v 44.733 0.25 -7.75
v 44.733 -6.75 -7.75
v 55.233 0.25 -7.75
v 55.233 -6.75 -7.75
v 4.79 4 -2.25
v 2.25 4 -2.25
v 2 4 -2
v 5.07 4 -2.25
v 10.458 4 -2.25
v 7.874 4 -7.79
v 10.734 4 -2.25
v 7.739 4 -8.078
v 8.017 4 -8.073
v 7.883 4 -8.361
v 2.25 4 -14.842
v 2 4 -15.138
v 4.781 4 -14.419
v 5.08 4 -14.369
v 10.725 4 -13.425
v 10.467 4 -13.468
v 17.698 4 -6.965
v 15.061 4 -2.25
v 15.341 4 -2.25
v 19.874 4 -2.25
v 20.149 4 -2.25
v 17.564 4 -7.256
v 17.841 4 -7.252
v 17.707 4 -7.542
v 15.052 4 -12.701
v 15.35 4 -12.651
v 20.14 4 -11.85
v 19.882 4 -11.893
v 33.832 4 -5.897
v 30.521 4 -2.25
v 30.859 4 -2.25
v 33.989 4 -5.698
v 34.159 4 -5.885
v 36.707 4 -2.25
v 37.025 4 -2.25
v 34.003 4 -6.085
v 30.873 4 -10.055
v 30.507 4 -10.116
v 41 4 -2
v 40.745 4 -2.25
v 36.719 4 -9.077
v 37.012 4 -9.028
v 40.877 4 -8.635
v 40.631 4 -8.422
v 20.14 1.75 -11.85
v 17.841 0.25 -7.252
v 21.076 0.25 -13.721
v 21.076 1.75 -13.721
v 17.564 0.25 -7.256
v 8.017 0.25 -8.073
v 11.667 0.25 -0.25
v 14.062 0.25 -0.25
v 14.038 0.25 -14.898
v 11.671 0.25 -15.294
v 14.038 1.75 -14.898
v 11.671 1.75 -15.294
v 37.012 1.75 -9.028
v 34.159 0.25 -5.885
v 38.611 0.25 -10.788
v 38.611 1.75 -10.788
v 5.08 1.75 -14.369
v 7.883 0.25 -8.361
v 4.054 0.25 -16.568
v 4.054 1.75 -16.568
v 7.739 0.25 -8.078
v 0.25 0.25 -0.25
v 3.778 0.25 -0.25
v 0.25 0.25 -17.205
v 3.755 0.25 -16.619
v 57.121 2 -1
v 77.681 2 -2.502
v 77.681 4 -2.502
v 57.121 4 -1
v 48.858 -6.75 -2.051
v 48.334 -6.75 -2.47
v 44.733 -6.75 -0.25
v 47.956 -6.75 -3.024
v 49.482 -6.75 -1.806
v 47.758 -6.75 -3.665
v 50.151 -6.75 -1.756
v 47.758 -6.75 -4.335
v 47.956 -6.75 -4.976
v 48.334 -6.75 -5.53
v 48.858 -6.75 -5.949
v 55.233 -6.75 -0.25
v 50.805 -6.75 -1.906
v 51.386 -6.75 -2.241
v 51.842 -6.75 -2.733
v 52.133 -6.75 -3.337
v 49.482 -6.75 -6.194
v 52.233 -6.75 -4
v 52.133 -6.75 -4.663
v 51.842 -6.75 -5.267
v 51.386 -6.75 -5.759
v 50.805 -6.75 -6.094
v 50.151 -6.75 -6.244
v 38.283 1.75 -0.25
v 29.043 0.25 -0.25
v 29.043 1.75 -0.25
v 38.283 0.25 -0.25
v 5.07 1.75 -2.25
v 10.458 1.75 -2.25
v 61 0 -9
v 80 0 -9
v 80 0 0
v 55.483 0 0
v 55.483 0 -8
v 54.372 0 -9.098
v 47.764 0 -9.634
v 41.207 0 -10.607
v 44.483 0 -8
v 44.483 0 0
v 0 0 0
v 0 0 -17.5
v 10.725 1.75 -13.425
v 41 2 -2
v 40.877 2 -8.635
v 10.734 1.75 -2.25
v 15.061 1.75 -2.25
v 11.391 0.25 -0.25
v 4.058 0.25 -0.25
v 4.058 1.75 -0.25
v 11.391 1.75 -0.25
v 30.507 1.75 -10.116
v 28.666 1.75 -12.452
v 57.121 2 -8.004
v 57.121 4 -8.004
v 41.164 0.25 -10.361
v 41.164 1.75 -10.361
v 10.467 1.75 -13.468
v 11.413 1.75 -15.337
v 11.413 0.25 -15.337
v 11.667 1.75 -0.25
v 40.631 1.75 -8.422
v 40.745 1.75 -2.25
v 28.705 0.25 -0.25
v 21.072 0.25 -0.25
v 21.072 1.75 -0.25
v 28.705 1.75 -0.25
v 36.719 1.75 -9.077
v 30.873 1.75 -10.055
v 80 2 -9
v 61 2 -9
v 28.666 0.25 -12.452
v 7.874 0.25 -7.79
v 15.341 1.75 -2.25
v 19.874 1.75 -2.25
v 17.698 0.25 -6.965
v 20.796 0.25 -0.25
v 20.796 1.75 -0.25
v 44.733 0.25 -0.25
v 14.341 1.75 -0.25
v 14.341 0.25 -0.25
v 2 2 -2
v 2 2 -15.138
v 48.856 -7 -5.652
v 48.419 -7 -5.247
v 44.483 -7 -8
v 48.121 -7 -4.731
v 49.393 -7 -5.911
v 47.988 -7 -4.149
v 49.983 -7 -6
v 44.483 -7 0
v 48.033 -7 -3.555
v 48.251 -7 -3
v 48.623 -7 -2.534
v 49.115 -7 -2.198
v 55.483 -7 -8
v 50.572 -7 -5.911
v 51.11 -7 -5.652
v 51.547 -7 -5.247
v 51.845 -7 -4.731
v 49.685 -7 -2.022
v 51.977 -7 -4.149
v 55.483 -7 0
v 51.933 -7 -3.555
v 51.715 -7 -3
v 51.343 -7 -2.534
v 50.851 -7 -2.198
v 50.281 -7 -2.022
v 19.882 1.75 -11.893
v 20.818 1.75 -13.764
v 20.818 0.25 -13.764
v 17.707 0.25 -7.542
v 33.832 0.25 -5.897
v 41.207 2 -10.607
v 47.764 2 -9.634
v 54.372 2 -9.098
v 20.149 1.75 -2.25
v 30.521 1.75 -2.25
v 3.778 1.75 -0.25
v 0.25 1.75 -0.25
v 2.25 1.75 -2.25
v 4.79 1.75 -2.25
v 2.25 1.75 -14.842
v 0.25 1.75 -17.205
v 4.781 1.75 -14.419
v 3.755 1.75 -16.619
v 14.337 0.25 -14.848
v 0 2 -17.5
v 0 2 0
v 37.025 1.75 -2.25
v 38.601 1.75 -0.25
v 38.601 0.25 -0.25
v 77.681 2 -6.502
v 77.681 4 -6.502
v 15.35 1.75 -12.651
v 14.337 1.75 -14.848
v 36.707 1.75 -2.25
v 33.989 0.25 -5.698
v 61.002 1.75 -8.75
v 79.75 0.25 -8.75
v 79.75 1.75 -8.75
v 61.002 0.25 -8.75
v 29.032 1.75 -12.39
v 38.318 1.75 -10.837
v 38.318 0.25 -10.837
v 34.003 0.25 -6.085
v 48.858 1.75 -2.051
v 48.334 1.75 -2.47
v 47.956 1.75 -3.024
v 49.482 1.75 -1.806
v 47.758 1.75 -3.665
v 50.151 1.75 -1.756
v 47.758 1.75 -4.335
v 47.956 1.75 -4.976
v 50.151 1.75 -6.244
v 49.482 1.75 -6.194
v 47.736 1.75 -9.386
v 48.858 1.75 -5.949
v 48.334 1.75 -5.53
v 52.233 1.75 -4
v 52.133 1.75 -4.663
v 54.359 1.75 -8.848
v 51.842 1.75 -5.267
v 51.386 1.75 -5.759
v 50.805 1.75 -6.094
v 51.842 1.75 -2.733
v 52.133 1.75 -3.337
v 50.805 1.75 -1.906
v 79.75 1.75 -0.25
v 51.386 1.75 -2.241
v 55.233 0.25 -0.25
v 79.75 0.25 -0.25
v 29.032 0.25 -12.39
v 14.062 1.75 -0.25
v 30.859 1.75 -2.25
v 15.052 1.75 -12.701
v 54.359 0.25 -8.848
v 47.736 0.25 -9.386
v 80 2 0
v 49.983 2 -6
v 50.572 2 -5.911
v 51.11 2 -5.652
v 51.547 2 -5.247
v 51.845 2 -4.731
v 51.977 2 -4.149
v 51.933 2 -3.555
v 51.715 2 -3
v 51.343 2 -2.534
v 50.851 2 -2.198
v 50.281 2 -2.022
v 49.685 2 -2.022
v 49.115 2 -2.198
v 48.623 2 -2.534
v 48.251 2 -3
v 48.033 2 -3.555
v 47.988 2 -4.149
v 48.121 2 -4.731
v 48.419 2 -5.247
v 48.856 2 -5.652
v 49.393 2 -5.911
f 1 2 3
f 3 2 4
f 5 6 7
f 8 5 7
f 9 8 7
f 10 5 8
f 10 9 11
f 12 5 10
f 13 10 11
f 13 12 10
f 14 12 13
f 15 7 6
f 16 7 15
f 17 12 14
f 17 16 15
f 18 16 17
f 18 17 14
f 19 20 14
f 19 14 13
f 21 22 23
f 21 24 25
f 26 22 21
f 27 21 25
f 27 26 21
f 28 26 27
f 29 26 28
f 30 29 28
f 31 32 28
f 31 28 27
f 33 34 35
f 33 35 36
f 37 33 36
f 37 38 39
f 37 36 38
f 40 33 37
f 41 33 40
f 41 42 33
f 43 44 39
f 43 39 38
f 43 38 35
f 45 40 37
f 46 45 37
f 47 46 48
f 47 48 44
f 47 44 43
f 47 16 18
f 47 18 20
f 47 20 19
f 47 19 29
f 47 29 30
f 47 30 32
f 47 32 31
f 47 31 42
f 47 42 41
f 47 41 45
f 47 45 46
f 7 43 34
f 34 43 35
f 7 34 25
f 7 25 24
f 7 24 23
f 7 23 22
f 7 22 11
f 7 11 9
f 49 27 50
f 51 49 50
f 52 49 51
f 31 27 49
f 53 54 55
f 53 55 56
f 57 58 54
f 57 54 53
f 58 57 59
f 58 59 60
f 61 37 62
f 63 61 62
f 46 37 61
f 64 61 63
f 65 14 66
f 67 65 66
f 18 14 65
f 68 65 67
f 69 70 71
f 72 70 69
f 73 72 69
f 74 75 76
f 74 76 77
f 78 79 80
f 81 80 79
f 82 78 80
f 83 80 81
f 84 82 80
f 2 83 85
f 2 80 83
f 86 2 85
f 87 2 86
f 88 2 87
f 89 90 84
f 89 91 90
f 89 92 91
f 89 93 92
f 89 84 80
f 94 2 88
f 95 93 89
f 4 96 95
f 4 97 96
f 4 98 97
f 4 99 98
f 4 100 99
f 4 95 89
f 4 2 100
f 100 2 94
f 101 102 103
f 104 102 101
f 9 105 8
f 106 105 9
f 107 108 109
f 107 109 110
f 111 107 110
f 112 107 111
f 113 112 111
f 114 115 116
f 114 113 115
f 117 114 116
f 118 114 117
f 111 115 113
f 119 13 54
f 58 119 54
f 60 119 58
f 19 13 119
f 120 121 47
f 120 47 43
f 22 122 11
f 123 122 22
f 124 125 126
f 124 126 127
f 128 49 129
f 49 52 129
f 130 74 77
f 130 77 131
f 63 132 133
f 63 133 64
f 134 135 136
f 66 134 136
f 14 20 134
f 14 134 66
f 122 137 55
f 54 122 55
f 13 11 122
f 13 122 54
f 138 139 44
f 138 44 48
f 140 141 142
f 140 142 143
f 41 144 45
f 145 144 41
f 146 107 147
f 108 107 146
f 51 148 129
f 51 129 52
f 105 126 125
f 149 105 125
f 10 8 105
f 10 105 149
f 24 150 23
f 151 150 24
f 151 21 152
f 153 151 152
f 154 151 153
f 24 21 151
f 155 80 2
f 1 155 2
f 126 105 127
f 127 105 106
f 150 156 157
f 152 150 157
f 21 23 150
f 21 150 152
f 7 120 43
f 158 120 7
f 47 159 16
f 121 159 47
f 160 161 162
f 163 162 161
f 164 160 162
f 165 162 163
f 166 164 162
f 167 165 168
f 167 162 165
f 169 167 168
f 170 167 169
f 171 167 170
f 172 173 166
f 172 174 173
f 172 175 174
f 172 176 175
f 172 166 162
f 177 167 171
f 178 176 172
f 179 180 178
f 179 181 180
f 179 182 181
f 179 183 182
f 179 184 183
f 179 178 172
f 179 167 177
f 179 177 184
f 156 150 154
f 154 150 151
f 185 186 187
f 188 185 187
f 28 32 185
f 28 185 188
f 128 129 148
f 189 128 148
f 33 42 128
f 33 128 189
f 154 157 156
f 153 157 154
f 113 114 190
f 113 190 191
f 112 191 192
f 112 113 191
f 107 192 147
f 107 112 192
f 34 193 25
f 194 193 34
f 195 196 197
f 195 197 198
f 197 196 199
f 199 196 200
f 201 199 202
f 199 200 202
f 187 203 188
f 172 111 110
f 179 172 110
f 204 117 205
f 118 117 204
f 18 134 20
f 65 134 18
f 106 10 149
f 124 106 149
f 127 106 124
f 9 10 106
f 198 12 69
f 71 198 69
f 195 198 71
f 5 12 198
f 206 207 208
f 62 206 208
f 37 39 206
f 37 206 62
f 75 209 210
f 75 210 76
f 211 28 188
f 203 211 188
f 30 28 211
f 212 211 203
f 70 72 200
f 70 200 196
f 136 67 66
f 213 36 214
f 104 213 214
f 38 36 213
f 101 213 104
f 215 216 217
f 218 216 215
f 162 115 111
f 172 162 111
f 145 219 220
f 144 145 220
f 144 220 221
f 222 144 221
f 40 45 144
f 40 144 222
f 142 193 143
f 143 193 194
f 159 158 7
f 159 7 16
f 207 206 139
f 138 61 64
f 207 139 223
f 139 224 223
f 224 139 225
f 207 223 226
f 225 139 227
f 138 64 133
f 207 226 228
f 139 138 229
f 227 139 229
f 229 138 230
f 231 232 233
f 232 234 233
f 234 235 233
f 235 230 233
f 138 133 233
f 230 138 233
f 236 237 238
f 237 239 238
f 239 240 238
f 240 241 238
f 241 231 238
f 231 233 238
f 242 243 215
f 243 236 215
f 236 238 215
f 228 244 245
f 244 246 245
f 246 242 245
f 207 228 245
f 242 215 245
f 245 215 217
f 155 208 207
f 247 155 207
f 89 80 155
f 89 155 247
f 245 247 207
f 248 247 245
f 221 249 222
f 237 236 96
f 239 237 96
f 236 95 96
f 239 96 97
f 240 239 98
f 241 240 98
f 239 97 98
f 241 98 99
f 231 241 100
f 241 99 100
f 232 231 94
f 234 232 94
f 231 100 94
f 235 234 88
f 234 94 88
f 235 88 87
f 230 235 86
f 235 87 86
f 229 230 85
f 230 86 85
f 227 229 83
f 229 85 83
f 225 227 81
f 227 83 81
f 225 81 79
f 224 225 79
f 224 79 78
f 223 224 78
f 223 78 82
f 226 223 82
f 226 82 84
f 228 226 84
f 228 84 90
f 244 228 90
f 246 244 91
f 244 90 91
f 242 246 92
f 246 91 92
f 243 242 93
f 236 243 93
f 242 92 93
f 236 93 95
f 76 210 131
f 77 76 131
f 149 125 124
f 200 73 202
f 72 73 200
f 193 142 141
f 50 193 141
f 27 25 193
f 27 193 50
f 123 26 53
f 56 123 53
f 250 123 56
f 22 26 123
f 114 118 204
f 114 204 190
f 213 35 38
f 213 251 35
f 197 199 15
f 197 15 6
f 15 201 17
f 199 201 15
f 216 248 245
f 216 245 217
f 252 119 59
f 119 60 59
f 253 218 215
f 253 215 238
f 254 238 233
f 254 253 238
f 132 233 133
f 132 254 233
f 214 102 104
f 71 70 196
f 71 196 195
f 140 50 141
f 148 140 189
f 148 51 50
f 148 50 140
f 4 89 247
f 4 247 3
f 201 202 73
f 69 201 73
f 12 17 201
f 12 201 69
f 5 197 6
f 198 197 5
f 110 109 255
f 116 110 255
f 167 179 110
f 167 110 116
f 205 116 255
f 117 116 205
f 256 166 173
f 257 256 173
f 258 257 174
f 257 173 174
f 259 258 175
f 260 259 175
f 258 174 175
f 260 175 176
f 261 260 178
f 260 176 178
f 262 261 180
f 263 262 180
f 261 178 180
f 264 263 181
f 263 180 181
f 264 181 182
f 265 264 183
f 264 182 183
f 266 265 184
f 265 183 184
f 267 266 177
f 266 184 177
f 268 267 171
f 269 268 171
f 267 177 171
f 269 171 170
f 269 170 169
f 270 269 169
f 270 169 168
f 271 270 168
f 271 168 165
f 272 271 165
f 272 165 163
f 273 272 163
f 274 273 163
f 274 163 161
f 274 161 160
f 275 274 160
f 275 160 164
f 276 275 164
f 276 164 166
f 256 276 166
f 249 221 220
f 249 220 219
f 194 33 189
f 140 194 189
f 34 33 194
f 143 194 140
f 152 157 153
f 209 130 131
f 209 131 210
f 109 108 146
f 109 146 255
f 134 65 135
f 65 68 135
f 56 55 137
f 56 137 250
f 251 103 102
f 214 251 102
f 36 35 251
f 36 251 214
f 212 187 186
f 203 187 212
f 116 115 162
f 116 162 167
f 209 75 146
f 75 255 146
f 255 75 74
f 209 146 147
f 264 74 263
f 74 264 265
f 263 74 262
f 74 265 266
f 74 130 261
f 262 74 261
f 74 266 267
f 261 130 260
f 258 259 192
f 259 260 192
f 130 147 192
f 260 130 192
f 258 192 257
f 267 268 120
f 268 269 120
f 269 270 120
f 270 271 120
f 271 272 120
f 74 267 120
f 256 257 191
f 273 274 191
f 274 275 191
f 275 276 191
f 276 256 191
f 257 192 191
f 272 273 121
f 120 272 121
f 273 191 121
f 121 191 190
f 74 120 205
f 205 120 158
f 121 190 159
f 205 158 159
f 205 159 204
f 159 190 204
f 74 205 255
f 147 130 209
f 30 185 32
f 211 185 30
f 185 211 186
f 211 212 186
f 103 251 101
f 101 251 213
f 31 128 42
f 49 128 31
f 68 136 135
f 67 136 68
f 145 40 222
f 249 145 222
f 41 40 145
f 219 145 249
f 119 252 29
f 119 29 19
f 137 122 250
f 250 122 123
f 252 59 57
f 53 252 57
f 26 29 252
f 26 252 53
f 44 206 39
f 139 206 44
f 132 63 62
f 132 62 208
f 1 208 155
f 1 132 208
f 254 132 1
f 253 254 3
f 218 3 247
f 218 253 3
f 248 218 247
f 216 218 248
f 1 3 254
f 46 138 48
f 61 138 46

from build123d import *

# Parameters (mm, degrees)
BOSS_EXTRUDE1_DEPTH = 2
SKETCH2_W           = 11
SKETCH2_H           = 8
BOSS_EXTRUDE2_DEPTH = 7
SKETCH3_R           = 2
CUT_EXTRUDE2_DEPTH  = 83.38476801
BOSS_EXTRUDE3_DEPTH = 2
SHELL1_START        = 0.25
SHELL1_DEPTH        = 3.75
SHELL1_2_OUTLINE_R  = 2.25
SHELL1_2_DEPTH      = 1.5
SHELL1_START_2      = -6.75
SHELL1_3_OUTLINE_W  = 10.5
SHELL1_3_OUTLINE_H  = 7.5
SHELL1_3_OUTLINE_R  = 2.25
SHELL1_3_DEPTH      = 7
RIB2_REACH          = 84.627
BOSS_EXTRUDE4_DEPTH = 2


# Read off the part's stored shape, not the designer's step: Shell1
with BuildPart() as part:
    # Sketch1 → Boss-Extrude1 (new body)
    with BuildSketch(Plane(origin=(0, 0, 0), x_dir=(1, 0, 0), z_dir=(0, 1, 0))):
        with BuildLine():
            Line((0, 0), (0, 17.5))
            Line((0, 17.5), (41.207252266, 10.607357821))
            ThreePointArc((41.207252266, 10.607357821), (51.063628859, 9.311158863), (61, 9))
            Line((61, 9), (80, 9))
            Line((80, 9), (80, 0))
            Line((80, 0), (0, 0))
        make_face()
    extrude(amount=BOSS_EXTRUDE1_DEPTH)

    # Sketch2 → Boss-Extrude2 (add)
    with BuildSketch(Plane.XZ):
        with Locations((49.982902032, -4)):
            Rectangle(SKETCH2_W, SKETCH2_H)
    extrude(amount=BOSS_EXTRUDE2_DEPTH)

    # Sketch3 → Cut-Extrude2 (cut, through all)
    with BuildSketch(Plane.XZ.offset(7)):
        with Locations(Location((49.982902032, -4, 0), (0, 0, 270))):
            Circle(SKETCH3_R)
    extrude(amount=-CUT_EXTRUDE2_DEPTH, mode=Mode.SUBTRACT)

    # Sketch4 → Boss-Extrude3 (add)
    with BuildSketch(Plane(origin=(0, 2, 0), x_dir=(1, 0, 0), z_dir=(0, 1, 0))):
        Polygon((40.877300801, 8.634762569), (41, 2), (2, 2), (2, 15.137679132), align=None)
    extrude(amount=BOSS_EXTRUDE3_DEPTH)

    # Shell1 outline → Shell1 (cut)
    with BuildSketch(Plane(origin=(0, 0, 0), x_dir=(1, 0, 0), z_dir=(0, 1, 0)).offset(SHELL1_START)):
        Polygon((2.25, 2.25), (40.745333907, 2.25), (40.631184307, 8.422456723), (2.25, 14.842389024), align=None)
    extrude(amount=SHELL1_DEPTH, mode=Mode.SUBTRACT)

    # Shell1 2 outline → Shell1 2 (cut)
    with BuildSketch(Plane(origin=(0, 0, 0), x_dir=(1, 0, 0), z_dir=(0, 1, 0)).offset(SHELL1_START)):
        with BuildLine():
            Line((79.75, 0.25), (79.75, 8.75))
            Line((79.75, 8.75), (61.002301351, 8.75))
            ThreePointArc((61.002301351, 8.75), (51.043164326, 9.06199776), (41.164190751, 10.361087437))
            Line((41.164190751, 10.361087437), (0.25, 17.204709892))
            Line((0.25, 17.204709892), (0.25, 0.25))
            Line((0.25, 0.25), (79.75, 0.25))
        make_face()
        Polygon((40.631184307, 8.422456723), (40.745333907, 2.25), (2.25, 2.25), (2.25, 14.842389024), align=None, mode=Mode.SUBTRACT)
        with Locations((49.982902032, 4)):
            Circle(SHELL1_2_OUTLINE_R, mode=Mode.SUBTRACT)
    extrude(amount=SHELL1_2_DEPTH, mode=Mode.SUBTRACT)

    # Shell1 3 outline → Shell1 3 (cut)
    with BuildSketch(Plane(origin=(0, 0, 0), x_dir=(1, 0, 0), z_dir=(0, 1, 0)).offset(SHELL1_START_2)):
        with Locations((49.982902032, 4)):
            Rectangle(SHELL1_3_OUTLINE_W, SHELL1_3_OUTLINE_H)
        with Locations((49.982902032, 4)):
            Circle(SHELL1_3_OUTLINE_R, mode=Mode.SUBTRACT)
    extrude(amount=SHELL1_3_DEPTH, mode=Mode.SUBTRACT)

    # Sketch8 walls → Rib2 (add, up to next)
    with BuildSketch(Plane(origin=(0, 4, 0), x_dir=(1, 0, 0), z_dir=(0, 1, 0)), mode=Mode.PRIVATE) as rib2_sk1:
        Polygon((-30.5404545, 90.126090222), (45.840432464, -73.587738012), (46.06698827, -73.482038123), (-30.313898694, 90.231790111), align=None)
    rib2_tool1 = extrude(rib2_sk1.sketch, amount=-RIB2_REACH, mode=Mode.PRIVATE) - part.part
    # Sketch8 walls → Rib2 (add, up to next)
    with BuildSketch(Plane(origin=(0, 4, 0), x_dir=(1, 0, 0), z_dir=(0, 1, 0)), mode=Mode.PRIVATE) as rib2_sk2:
        Polygon((48.244103521, 88.119990894), (-32.940634825, -72.310767507), (-32.717569751, -72.423647853), (48.467168595, 88.007110547), align=None)
    rib2_tool2 = extrude(rib2_sk2.sketch, amount=-RIB2_REACH, mode=Mode.PRIVATE) - part.part
    # Sketch8 walls → Rib2 (add, up to next)
    with BuildSketch(Plane(origin=(0, 4, 0), x_dir=(1, 0, 0), z_dir=(0, 1, 0)), mode=Mode.PRIVATE) as rib2_sk3:
        Polygon((-19.945501862, 88.559114212), (54.930872718, -73.737760739), (55.15787846, -73.633030645), (-19.718496119, 88.663844307), align=None)
    rib2_tool3 = extrude(rib2_sk3.sketch, amount=-RIB2_REACH, mode=Mode.PRIVATE) - part.part
    # Sketch8 walls → Rib2 (add, up to next)
    with BuildSketch(Plane(origin=(0, 4, 0), x_dir=(1, 0, 0), z_dir=(0, 1, 0)), mode=Mode.PRIVATE) as rib2_sk4:
        Polygon((57.294710169, 86.727791097), (-22.305946259, -72.494493497), (-22.082333571, -72.606285115), (57.518322857, 86.615999479), align=None)
    rib2_tool4 = extrude(rib2_sk4.sketch, amount=-RIB2_REACH, mode=Mode.PRIVATE) - part.part
    # Sketch8 walls → Rib2 (add, up to next)
    with BuildSketch(Plane(origin=(0, 4, 0), x_dir=(1, 0, 0), z_dir=(0, 1, 0)), mode=Mode.PRIVATE) as rib2_sk5:
        Polygon((-21.175633704, 75.686160498), (88.535096121, -63.505624935), (88.731438538, -63.350868173), (-20.979291286, 75.840917259), align=None)
    rib2_tool5 = extrude(rib2_sk5.sketch, amount=-RIB2_REACH, mode=Mode.PRIVATE) - part.part
    # Sketch8 walls → Rib2 (add, up to next)
    with BuildSketch(Plane(origin=(0, 4, 0), x_dir=(1, 0, 0), z_dir=(0, 1, 0)), mode=Mode.PRIVATE) as rib2_sk6:
        Polygon((92.986420538, 71.052239579), (-25.615710829, -59.5819061), (-25.430615704, -59.749953101), (93.171515663, 70.884192578), align=None)
    rib2_tool6 = extrude(rib2_sk6.sketch, amount=-RIB2_REACH, mode=Mode.PRIVATE) - part.part
    add(rib2_tool1.solids().sort_by_distance((7.763266885, 4, -8.32202605))[0])
    add(rib2_tool2.solids().sort_by_distance((7.763266885, 4, -7.84817152))[0])
    add(rib2_tool3.solids().sort_by_distance((17.606188299, 4, -7.463041784))[0])
    add(rib2_tool4.solids().sort_by_distance((17.606188299, 4, -7.060752991))[0])
    add(rib2_tool5.solids().sort_by_distance((33.777902417, 4, -6.167646162))[0])
    add(rib2_tool6.solids().sort_by_distance((33.777902417, 4, -5.651143239))[0])

    # Sketch9 → Boss-Extrude4 (add)
    with BuildSketch(Plane(origin=(0, 2, 0), x_dir=(1, 0, 0), z_dir=(0, 1, 0))):
        Polygon((77.681321794, 6.50188709), (77.681321794, 2.50188709), (57.121277642, 1), (57.121277642, 8.00377418), align=None)
    extrude(amount=BOSS_EXTRUDE4_DEPTH)


solid = part.part
